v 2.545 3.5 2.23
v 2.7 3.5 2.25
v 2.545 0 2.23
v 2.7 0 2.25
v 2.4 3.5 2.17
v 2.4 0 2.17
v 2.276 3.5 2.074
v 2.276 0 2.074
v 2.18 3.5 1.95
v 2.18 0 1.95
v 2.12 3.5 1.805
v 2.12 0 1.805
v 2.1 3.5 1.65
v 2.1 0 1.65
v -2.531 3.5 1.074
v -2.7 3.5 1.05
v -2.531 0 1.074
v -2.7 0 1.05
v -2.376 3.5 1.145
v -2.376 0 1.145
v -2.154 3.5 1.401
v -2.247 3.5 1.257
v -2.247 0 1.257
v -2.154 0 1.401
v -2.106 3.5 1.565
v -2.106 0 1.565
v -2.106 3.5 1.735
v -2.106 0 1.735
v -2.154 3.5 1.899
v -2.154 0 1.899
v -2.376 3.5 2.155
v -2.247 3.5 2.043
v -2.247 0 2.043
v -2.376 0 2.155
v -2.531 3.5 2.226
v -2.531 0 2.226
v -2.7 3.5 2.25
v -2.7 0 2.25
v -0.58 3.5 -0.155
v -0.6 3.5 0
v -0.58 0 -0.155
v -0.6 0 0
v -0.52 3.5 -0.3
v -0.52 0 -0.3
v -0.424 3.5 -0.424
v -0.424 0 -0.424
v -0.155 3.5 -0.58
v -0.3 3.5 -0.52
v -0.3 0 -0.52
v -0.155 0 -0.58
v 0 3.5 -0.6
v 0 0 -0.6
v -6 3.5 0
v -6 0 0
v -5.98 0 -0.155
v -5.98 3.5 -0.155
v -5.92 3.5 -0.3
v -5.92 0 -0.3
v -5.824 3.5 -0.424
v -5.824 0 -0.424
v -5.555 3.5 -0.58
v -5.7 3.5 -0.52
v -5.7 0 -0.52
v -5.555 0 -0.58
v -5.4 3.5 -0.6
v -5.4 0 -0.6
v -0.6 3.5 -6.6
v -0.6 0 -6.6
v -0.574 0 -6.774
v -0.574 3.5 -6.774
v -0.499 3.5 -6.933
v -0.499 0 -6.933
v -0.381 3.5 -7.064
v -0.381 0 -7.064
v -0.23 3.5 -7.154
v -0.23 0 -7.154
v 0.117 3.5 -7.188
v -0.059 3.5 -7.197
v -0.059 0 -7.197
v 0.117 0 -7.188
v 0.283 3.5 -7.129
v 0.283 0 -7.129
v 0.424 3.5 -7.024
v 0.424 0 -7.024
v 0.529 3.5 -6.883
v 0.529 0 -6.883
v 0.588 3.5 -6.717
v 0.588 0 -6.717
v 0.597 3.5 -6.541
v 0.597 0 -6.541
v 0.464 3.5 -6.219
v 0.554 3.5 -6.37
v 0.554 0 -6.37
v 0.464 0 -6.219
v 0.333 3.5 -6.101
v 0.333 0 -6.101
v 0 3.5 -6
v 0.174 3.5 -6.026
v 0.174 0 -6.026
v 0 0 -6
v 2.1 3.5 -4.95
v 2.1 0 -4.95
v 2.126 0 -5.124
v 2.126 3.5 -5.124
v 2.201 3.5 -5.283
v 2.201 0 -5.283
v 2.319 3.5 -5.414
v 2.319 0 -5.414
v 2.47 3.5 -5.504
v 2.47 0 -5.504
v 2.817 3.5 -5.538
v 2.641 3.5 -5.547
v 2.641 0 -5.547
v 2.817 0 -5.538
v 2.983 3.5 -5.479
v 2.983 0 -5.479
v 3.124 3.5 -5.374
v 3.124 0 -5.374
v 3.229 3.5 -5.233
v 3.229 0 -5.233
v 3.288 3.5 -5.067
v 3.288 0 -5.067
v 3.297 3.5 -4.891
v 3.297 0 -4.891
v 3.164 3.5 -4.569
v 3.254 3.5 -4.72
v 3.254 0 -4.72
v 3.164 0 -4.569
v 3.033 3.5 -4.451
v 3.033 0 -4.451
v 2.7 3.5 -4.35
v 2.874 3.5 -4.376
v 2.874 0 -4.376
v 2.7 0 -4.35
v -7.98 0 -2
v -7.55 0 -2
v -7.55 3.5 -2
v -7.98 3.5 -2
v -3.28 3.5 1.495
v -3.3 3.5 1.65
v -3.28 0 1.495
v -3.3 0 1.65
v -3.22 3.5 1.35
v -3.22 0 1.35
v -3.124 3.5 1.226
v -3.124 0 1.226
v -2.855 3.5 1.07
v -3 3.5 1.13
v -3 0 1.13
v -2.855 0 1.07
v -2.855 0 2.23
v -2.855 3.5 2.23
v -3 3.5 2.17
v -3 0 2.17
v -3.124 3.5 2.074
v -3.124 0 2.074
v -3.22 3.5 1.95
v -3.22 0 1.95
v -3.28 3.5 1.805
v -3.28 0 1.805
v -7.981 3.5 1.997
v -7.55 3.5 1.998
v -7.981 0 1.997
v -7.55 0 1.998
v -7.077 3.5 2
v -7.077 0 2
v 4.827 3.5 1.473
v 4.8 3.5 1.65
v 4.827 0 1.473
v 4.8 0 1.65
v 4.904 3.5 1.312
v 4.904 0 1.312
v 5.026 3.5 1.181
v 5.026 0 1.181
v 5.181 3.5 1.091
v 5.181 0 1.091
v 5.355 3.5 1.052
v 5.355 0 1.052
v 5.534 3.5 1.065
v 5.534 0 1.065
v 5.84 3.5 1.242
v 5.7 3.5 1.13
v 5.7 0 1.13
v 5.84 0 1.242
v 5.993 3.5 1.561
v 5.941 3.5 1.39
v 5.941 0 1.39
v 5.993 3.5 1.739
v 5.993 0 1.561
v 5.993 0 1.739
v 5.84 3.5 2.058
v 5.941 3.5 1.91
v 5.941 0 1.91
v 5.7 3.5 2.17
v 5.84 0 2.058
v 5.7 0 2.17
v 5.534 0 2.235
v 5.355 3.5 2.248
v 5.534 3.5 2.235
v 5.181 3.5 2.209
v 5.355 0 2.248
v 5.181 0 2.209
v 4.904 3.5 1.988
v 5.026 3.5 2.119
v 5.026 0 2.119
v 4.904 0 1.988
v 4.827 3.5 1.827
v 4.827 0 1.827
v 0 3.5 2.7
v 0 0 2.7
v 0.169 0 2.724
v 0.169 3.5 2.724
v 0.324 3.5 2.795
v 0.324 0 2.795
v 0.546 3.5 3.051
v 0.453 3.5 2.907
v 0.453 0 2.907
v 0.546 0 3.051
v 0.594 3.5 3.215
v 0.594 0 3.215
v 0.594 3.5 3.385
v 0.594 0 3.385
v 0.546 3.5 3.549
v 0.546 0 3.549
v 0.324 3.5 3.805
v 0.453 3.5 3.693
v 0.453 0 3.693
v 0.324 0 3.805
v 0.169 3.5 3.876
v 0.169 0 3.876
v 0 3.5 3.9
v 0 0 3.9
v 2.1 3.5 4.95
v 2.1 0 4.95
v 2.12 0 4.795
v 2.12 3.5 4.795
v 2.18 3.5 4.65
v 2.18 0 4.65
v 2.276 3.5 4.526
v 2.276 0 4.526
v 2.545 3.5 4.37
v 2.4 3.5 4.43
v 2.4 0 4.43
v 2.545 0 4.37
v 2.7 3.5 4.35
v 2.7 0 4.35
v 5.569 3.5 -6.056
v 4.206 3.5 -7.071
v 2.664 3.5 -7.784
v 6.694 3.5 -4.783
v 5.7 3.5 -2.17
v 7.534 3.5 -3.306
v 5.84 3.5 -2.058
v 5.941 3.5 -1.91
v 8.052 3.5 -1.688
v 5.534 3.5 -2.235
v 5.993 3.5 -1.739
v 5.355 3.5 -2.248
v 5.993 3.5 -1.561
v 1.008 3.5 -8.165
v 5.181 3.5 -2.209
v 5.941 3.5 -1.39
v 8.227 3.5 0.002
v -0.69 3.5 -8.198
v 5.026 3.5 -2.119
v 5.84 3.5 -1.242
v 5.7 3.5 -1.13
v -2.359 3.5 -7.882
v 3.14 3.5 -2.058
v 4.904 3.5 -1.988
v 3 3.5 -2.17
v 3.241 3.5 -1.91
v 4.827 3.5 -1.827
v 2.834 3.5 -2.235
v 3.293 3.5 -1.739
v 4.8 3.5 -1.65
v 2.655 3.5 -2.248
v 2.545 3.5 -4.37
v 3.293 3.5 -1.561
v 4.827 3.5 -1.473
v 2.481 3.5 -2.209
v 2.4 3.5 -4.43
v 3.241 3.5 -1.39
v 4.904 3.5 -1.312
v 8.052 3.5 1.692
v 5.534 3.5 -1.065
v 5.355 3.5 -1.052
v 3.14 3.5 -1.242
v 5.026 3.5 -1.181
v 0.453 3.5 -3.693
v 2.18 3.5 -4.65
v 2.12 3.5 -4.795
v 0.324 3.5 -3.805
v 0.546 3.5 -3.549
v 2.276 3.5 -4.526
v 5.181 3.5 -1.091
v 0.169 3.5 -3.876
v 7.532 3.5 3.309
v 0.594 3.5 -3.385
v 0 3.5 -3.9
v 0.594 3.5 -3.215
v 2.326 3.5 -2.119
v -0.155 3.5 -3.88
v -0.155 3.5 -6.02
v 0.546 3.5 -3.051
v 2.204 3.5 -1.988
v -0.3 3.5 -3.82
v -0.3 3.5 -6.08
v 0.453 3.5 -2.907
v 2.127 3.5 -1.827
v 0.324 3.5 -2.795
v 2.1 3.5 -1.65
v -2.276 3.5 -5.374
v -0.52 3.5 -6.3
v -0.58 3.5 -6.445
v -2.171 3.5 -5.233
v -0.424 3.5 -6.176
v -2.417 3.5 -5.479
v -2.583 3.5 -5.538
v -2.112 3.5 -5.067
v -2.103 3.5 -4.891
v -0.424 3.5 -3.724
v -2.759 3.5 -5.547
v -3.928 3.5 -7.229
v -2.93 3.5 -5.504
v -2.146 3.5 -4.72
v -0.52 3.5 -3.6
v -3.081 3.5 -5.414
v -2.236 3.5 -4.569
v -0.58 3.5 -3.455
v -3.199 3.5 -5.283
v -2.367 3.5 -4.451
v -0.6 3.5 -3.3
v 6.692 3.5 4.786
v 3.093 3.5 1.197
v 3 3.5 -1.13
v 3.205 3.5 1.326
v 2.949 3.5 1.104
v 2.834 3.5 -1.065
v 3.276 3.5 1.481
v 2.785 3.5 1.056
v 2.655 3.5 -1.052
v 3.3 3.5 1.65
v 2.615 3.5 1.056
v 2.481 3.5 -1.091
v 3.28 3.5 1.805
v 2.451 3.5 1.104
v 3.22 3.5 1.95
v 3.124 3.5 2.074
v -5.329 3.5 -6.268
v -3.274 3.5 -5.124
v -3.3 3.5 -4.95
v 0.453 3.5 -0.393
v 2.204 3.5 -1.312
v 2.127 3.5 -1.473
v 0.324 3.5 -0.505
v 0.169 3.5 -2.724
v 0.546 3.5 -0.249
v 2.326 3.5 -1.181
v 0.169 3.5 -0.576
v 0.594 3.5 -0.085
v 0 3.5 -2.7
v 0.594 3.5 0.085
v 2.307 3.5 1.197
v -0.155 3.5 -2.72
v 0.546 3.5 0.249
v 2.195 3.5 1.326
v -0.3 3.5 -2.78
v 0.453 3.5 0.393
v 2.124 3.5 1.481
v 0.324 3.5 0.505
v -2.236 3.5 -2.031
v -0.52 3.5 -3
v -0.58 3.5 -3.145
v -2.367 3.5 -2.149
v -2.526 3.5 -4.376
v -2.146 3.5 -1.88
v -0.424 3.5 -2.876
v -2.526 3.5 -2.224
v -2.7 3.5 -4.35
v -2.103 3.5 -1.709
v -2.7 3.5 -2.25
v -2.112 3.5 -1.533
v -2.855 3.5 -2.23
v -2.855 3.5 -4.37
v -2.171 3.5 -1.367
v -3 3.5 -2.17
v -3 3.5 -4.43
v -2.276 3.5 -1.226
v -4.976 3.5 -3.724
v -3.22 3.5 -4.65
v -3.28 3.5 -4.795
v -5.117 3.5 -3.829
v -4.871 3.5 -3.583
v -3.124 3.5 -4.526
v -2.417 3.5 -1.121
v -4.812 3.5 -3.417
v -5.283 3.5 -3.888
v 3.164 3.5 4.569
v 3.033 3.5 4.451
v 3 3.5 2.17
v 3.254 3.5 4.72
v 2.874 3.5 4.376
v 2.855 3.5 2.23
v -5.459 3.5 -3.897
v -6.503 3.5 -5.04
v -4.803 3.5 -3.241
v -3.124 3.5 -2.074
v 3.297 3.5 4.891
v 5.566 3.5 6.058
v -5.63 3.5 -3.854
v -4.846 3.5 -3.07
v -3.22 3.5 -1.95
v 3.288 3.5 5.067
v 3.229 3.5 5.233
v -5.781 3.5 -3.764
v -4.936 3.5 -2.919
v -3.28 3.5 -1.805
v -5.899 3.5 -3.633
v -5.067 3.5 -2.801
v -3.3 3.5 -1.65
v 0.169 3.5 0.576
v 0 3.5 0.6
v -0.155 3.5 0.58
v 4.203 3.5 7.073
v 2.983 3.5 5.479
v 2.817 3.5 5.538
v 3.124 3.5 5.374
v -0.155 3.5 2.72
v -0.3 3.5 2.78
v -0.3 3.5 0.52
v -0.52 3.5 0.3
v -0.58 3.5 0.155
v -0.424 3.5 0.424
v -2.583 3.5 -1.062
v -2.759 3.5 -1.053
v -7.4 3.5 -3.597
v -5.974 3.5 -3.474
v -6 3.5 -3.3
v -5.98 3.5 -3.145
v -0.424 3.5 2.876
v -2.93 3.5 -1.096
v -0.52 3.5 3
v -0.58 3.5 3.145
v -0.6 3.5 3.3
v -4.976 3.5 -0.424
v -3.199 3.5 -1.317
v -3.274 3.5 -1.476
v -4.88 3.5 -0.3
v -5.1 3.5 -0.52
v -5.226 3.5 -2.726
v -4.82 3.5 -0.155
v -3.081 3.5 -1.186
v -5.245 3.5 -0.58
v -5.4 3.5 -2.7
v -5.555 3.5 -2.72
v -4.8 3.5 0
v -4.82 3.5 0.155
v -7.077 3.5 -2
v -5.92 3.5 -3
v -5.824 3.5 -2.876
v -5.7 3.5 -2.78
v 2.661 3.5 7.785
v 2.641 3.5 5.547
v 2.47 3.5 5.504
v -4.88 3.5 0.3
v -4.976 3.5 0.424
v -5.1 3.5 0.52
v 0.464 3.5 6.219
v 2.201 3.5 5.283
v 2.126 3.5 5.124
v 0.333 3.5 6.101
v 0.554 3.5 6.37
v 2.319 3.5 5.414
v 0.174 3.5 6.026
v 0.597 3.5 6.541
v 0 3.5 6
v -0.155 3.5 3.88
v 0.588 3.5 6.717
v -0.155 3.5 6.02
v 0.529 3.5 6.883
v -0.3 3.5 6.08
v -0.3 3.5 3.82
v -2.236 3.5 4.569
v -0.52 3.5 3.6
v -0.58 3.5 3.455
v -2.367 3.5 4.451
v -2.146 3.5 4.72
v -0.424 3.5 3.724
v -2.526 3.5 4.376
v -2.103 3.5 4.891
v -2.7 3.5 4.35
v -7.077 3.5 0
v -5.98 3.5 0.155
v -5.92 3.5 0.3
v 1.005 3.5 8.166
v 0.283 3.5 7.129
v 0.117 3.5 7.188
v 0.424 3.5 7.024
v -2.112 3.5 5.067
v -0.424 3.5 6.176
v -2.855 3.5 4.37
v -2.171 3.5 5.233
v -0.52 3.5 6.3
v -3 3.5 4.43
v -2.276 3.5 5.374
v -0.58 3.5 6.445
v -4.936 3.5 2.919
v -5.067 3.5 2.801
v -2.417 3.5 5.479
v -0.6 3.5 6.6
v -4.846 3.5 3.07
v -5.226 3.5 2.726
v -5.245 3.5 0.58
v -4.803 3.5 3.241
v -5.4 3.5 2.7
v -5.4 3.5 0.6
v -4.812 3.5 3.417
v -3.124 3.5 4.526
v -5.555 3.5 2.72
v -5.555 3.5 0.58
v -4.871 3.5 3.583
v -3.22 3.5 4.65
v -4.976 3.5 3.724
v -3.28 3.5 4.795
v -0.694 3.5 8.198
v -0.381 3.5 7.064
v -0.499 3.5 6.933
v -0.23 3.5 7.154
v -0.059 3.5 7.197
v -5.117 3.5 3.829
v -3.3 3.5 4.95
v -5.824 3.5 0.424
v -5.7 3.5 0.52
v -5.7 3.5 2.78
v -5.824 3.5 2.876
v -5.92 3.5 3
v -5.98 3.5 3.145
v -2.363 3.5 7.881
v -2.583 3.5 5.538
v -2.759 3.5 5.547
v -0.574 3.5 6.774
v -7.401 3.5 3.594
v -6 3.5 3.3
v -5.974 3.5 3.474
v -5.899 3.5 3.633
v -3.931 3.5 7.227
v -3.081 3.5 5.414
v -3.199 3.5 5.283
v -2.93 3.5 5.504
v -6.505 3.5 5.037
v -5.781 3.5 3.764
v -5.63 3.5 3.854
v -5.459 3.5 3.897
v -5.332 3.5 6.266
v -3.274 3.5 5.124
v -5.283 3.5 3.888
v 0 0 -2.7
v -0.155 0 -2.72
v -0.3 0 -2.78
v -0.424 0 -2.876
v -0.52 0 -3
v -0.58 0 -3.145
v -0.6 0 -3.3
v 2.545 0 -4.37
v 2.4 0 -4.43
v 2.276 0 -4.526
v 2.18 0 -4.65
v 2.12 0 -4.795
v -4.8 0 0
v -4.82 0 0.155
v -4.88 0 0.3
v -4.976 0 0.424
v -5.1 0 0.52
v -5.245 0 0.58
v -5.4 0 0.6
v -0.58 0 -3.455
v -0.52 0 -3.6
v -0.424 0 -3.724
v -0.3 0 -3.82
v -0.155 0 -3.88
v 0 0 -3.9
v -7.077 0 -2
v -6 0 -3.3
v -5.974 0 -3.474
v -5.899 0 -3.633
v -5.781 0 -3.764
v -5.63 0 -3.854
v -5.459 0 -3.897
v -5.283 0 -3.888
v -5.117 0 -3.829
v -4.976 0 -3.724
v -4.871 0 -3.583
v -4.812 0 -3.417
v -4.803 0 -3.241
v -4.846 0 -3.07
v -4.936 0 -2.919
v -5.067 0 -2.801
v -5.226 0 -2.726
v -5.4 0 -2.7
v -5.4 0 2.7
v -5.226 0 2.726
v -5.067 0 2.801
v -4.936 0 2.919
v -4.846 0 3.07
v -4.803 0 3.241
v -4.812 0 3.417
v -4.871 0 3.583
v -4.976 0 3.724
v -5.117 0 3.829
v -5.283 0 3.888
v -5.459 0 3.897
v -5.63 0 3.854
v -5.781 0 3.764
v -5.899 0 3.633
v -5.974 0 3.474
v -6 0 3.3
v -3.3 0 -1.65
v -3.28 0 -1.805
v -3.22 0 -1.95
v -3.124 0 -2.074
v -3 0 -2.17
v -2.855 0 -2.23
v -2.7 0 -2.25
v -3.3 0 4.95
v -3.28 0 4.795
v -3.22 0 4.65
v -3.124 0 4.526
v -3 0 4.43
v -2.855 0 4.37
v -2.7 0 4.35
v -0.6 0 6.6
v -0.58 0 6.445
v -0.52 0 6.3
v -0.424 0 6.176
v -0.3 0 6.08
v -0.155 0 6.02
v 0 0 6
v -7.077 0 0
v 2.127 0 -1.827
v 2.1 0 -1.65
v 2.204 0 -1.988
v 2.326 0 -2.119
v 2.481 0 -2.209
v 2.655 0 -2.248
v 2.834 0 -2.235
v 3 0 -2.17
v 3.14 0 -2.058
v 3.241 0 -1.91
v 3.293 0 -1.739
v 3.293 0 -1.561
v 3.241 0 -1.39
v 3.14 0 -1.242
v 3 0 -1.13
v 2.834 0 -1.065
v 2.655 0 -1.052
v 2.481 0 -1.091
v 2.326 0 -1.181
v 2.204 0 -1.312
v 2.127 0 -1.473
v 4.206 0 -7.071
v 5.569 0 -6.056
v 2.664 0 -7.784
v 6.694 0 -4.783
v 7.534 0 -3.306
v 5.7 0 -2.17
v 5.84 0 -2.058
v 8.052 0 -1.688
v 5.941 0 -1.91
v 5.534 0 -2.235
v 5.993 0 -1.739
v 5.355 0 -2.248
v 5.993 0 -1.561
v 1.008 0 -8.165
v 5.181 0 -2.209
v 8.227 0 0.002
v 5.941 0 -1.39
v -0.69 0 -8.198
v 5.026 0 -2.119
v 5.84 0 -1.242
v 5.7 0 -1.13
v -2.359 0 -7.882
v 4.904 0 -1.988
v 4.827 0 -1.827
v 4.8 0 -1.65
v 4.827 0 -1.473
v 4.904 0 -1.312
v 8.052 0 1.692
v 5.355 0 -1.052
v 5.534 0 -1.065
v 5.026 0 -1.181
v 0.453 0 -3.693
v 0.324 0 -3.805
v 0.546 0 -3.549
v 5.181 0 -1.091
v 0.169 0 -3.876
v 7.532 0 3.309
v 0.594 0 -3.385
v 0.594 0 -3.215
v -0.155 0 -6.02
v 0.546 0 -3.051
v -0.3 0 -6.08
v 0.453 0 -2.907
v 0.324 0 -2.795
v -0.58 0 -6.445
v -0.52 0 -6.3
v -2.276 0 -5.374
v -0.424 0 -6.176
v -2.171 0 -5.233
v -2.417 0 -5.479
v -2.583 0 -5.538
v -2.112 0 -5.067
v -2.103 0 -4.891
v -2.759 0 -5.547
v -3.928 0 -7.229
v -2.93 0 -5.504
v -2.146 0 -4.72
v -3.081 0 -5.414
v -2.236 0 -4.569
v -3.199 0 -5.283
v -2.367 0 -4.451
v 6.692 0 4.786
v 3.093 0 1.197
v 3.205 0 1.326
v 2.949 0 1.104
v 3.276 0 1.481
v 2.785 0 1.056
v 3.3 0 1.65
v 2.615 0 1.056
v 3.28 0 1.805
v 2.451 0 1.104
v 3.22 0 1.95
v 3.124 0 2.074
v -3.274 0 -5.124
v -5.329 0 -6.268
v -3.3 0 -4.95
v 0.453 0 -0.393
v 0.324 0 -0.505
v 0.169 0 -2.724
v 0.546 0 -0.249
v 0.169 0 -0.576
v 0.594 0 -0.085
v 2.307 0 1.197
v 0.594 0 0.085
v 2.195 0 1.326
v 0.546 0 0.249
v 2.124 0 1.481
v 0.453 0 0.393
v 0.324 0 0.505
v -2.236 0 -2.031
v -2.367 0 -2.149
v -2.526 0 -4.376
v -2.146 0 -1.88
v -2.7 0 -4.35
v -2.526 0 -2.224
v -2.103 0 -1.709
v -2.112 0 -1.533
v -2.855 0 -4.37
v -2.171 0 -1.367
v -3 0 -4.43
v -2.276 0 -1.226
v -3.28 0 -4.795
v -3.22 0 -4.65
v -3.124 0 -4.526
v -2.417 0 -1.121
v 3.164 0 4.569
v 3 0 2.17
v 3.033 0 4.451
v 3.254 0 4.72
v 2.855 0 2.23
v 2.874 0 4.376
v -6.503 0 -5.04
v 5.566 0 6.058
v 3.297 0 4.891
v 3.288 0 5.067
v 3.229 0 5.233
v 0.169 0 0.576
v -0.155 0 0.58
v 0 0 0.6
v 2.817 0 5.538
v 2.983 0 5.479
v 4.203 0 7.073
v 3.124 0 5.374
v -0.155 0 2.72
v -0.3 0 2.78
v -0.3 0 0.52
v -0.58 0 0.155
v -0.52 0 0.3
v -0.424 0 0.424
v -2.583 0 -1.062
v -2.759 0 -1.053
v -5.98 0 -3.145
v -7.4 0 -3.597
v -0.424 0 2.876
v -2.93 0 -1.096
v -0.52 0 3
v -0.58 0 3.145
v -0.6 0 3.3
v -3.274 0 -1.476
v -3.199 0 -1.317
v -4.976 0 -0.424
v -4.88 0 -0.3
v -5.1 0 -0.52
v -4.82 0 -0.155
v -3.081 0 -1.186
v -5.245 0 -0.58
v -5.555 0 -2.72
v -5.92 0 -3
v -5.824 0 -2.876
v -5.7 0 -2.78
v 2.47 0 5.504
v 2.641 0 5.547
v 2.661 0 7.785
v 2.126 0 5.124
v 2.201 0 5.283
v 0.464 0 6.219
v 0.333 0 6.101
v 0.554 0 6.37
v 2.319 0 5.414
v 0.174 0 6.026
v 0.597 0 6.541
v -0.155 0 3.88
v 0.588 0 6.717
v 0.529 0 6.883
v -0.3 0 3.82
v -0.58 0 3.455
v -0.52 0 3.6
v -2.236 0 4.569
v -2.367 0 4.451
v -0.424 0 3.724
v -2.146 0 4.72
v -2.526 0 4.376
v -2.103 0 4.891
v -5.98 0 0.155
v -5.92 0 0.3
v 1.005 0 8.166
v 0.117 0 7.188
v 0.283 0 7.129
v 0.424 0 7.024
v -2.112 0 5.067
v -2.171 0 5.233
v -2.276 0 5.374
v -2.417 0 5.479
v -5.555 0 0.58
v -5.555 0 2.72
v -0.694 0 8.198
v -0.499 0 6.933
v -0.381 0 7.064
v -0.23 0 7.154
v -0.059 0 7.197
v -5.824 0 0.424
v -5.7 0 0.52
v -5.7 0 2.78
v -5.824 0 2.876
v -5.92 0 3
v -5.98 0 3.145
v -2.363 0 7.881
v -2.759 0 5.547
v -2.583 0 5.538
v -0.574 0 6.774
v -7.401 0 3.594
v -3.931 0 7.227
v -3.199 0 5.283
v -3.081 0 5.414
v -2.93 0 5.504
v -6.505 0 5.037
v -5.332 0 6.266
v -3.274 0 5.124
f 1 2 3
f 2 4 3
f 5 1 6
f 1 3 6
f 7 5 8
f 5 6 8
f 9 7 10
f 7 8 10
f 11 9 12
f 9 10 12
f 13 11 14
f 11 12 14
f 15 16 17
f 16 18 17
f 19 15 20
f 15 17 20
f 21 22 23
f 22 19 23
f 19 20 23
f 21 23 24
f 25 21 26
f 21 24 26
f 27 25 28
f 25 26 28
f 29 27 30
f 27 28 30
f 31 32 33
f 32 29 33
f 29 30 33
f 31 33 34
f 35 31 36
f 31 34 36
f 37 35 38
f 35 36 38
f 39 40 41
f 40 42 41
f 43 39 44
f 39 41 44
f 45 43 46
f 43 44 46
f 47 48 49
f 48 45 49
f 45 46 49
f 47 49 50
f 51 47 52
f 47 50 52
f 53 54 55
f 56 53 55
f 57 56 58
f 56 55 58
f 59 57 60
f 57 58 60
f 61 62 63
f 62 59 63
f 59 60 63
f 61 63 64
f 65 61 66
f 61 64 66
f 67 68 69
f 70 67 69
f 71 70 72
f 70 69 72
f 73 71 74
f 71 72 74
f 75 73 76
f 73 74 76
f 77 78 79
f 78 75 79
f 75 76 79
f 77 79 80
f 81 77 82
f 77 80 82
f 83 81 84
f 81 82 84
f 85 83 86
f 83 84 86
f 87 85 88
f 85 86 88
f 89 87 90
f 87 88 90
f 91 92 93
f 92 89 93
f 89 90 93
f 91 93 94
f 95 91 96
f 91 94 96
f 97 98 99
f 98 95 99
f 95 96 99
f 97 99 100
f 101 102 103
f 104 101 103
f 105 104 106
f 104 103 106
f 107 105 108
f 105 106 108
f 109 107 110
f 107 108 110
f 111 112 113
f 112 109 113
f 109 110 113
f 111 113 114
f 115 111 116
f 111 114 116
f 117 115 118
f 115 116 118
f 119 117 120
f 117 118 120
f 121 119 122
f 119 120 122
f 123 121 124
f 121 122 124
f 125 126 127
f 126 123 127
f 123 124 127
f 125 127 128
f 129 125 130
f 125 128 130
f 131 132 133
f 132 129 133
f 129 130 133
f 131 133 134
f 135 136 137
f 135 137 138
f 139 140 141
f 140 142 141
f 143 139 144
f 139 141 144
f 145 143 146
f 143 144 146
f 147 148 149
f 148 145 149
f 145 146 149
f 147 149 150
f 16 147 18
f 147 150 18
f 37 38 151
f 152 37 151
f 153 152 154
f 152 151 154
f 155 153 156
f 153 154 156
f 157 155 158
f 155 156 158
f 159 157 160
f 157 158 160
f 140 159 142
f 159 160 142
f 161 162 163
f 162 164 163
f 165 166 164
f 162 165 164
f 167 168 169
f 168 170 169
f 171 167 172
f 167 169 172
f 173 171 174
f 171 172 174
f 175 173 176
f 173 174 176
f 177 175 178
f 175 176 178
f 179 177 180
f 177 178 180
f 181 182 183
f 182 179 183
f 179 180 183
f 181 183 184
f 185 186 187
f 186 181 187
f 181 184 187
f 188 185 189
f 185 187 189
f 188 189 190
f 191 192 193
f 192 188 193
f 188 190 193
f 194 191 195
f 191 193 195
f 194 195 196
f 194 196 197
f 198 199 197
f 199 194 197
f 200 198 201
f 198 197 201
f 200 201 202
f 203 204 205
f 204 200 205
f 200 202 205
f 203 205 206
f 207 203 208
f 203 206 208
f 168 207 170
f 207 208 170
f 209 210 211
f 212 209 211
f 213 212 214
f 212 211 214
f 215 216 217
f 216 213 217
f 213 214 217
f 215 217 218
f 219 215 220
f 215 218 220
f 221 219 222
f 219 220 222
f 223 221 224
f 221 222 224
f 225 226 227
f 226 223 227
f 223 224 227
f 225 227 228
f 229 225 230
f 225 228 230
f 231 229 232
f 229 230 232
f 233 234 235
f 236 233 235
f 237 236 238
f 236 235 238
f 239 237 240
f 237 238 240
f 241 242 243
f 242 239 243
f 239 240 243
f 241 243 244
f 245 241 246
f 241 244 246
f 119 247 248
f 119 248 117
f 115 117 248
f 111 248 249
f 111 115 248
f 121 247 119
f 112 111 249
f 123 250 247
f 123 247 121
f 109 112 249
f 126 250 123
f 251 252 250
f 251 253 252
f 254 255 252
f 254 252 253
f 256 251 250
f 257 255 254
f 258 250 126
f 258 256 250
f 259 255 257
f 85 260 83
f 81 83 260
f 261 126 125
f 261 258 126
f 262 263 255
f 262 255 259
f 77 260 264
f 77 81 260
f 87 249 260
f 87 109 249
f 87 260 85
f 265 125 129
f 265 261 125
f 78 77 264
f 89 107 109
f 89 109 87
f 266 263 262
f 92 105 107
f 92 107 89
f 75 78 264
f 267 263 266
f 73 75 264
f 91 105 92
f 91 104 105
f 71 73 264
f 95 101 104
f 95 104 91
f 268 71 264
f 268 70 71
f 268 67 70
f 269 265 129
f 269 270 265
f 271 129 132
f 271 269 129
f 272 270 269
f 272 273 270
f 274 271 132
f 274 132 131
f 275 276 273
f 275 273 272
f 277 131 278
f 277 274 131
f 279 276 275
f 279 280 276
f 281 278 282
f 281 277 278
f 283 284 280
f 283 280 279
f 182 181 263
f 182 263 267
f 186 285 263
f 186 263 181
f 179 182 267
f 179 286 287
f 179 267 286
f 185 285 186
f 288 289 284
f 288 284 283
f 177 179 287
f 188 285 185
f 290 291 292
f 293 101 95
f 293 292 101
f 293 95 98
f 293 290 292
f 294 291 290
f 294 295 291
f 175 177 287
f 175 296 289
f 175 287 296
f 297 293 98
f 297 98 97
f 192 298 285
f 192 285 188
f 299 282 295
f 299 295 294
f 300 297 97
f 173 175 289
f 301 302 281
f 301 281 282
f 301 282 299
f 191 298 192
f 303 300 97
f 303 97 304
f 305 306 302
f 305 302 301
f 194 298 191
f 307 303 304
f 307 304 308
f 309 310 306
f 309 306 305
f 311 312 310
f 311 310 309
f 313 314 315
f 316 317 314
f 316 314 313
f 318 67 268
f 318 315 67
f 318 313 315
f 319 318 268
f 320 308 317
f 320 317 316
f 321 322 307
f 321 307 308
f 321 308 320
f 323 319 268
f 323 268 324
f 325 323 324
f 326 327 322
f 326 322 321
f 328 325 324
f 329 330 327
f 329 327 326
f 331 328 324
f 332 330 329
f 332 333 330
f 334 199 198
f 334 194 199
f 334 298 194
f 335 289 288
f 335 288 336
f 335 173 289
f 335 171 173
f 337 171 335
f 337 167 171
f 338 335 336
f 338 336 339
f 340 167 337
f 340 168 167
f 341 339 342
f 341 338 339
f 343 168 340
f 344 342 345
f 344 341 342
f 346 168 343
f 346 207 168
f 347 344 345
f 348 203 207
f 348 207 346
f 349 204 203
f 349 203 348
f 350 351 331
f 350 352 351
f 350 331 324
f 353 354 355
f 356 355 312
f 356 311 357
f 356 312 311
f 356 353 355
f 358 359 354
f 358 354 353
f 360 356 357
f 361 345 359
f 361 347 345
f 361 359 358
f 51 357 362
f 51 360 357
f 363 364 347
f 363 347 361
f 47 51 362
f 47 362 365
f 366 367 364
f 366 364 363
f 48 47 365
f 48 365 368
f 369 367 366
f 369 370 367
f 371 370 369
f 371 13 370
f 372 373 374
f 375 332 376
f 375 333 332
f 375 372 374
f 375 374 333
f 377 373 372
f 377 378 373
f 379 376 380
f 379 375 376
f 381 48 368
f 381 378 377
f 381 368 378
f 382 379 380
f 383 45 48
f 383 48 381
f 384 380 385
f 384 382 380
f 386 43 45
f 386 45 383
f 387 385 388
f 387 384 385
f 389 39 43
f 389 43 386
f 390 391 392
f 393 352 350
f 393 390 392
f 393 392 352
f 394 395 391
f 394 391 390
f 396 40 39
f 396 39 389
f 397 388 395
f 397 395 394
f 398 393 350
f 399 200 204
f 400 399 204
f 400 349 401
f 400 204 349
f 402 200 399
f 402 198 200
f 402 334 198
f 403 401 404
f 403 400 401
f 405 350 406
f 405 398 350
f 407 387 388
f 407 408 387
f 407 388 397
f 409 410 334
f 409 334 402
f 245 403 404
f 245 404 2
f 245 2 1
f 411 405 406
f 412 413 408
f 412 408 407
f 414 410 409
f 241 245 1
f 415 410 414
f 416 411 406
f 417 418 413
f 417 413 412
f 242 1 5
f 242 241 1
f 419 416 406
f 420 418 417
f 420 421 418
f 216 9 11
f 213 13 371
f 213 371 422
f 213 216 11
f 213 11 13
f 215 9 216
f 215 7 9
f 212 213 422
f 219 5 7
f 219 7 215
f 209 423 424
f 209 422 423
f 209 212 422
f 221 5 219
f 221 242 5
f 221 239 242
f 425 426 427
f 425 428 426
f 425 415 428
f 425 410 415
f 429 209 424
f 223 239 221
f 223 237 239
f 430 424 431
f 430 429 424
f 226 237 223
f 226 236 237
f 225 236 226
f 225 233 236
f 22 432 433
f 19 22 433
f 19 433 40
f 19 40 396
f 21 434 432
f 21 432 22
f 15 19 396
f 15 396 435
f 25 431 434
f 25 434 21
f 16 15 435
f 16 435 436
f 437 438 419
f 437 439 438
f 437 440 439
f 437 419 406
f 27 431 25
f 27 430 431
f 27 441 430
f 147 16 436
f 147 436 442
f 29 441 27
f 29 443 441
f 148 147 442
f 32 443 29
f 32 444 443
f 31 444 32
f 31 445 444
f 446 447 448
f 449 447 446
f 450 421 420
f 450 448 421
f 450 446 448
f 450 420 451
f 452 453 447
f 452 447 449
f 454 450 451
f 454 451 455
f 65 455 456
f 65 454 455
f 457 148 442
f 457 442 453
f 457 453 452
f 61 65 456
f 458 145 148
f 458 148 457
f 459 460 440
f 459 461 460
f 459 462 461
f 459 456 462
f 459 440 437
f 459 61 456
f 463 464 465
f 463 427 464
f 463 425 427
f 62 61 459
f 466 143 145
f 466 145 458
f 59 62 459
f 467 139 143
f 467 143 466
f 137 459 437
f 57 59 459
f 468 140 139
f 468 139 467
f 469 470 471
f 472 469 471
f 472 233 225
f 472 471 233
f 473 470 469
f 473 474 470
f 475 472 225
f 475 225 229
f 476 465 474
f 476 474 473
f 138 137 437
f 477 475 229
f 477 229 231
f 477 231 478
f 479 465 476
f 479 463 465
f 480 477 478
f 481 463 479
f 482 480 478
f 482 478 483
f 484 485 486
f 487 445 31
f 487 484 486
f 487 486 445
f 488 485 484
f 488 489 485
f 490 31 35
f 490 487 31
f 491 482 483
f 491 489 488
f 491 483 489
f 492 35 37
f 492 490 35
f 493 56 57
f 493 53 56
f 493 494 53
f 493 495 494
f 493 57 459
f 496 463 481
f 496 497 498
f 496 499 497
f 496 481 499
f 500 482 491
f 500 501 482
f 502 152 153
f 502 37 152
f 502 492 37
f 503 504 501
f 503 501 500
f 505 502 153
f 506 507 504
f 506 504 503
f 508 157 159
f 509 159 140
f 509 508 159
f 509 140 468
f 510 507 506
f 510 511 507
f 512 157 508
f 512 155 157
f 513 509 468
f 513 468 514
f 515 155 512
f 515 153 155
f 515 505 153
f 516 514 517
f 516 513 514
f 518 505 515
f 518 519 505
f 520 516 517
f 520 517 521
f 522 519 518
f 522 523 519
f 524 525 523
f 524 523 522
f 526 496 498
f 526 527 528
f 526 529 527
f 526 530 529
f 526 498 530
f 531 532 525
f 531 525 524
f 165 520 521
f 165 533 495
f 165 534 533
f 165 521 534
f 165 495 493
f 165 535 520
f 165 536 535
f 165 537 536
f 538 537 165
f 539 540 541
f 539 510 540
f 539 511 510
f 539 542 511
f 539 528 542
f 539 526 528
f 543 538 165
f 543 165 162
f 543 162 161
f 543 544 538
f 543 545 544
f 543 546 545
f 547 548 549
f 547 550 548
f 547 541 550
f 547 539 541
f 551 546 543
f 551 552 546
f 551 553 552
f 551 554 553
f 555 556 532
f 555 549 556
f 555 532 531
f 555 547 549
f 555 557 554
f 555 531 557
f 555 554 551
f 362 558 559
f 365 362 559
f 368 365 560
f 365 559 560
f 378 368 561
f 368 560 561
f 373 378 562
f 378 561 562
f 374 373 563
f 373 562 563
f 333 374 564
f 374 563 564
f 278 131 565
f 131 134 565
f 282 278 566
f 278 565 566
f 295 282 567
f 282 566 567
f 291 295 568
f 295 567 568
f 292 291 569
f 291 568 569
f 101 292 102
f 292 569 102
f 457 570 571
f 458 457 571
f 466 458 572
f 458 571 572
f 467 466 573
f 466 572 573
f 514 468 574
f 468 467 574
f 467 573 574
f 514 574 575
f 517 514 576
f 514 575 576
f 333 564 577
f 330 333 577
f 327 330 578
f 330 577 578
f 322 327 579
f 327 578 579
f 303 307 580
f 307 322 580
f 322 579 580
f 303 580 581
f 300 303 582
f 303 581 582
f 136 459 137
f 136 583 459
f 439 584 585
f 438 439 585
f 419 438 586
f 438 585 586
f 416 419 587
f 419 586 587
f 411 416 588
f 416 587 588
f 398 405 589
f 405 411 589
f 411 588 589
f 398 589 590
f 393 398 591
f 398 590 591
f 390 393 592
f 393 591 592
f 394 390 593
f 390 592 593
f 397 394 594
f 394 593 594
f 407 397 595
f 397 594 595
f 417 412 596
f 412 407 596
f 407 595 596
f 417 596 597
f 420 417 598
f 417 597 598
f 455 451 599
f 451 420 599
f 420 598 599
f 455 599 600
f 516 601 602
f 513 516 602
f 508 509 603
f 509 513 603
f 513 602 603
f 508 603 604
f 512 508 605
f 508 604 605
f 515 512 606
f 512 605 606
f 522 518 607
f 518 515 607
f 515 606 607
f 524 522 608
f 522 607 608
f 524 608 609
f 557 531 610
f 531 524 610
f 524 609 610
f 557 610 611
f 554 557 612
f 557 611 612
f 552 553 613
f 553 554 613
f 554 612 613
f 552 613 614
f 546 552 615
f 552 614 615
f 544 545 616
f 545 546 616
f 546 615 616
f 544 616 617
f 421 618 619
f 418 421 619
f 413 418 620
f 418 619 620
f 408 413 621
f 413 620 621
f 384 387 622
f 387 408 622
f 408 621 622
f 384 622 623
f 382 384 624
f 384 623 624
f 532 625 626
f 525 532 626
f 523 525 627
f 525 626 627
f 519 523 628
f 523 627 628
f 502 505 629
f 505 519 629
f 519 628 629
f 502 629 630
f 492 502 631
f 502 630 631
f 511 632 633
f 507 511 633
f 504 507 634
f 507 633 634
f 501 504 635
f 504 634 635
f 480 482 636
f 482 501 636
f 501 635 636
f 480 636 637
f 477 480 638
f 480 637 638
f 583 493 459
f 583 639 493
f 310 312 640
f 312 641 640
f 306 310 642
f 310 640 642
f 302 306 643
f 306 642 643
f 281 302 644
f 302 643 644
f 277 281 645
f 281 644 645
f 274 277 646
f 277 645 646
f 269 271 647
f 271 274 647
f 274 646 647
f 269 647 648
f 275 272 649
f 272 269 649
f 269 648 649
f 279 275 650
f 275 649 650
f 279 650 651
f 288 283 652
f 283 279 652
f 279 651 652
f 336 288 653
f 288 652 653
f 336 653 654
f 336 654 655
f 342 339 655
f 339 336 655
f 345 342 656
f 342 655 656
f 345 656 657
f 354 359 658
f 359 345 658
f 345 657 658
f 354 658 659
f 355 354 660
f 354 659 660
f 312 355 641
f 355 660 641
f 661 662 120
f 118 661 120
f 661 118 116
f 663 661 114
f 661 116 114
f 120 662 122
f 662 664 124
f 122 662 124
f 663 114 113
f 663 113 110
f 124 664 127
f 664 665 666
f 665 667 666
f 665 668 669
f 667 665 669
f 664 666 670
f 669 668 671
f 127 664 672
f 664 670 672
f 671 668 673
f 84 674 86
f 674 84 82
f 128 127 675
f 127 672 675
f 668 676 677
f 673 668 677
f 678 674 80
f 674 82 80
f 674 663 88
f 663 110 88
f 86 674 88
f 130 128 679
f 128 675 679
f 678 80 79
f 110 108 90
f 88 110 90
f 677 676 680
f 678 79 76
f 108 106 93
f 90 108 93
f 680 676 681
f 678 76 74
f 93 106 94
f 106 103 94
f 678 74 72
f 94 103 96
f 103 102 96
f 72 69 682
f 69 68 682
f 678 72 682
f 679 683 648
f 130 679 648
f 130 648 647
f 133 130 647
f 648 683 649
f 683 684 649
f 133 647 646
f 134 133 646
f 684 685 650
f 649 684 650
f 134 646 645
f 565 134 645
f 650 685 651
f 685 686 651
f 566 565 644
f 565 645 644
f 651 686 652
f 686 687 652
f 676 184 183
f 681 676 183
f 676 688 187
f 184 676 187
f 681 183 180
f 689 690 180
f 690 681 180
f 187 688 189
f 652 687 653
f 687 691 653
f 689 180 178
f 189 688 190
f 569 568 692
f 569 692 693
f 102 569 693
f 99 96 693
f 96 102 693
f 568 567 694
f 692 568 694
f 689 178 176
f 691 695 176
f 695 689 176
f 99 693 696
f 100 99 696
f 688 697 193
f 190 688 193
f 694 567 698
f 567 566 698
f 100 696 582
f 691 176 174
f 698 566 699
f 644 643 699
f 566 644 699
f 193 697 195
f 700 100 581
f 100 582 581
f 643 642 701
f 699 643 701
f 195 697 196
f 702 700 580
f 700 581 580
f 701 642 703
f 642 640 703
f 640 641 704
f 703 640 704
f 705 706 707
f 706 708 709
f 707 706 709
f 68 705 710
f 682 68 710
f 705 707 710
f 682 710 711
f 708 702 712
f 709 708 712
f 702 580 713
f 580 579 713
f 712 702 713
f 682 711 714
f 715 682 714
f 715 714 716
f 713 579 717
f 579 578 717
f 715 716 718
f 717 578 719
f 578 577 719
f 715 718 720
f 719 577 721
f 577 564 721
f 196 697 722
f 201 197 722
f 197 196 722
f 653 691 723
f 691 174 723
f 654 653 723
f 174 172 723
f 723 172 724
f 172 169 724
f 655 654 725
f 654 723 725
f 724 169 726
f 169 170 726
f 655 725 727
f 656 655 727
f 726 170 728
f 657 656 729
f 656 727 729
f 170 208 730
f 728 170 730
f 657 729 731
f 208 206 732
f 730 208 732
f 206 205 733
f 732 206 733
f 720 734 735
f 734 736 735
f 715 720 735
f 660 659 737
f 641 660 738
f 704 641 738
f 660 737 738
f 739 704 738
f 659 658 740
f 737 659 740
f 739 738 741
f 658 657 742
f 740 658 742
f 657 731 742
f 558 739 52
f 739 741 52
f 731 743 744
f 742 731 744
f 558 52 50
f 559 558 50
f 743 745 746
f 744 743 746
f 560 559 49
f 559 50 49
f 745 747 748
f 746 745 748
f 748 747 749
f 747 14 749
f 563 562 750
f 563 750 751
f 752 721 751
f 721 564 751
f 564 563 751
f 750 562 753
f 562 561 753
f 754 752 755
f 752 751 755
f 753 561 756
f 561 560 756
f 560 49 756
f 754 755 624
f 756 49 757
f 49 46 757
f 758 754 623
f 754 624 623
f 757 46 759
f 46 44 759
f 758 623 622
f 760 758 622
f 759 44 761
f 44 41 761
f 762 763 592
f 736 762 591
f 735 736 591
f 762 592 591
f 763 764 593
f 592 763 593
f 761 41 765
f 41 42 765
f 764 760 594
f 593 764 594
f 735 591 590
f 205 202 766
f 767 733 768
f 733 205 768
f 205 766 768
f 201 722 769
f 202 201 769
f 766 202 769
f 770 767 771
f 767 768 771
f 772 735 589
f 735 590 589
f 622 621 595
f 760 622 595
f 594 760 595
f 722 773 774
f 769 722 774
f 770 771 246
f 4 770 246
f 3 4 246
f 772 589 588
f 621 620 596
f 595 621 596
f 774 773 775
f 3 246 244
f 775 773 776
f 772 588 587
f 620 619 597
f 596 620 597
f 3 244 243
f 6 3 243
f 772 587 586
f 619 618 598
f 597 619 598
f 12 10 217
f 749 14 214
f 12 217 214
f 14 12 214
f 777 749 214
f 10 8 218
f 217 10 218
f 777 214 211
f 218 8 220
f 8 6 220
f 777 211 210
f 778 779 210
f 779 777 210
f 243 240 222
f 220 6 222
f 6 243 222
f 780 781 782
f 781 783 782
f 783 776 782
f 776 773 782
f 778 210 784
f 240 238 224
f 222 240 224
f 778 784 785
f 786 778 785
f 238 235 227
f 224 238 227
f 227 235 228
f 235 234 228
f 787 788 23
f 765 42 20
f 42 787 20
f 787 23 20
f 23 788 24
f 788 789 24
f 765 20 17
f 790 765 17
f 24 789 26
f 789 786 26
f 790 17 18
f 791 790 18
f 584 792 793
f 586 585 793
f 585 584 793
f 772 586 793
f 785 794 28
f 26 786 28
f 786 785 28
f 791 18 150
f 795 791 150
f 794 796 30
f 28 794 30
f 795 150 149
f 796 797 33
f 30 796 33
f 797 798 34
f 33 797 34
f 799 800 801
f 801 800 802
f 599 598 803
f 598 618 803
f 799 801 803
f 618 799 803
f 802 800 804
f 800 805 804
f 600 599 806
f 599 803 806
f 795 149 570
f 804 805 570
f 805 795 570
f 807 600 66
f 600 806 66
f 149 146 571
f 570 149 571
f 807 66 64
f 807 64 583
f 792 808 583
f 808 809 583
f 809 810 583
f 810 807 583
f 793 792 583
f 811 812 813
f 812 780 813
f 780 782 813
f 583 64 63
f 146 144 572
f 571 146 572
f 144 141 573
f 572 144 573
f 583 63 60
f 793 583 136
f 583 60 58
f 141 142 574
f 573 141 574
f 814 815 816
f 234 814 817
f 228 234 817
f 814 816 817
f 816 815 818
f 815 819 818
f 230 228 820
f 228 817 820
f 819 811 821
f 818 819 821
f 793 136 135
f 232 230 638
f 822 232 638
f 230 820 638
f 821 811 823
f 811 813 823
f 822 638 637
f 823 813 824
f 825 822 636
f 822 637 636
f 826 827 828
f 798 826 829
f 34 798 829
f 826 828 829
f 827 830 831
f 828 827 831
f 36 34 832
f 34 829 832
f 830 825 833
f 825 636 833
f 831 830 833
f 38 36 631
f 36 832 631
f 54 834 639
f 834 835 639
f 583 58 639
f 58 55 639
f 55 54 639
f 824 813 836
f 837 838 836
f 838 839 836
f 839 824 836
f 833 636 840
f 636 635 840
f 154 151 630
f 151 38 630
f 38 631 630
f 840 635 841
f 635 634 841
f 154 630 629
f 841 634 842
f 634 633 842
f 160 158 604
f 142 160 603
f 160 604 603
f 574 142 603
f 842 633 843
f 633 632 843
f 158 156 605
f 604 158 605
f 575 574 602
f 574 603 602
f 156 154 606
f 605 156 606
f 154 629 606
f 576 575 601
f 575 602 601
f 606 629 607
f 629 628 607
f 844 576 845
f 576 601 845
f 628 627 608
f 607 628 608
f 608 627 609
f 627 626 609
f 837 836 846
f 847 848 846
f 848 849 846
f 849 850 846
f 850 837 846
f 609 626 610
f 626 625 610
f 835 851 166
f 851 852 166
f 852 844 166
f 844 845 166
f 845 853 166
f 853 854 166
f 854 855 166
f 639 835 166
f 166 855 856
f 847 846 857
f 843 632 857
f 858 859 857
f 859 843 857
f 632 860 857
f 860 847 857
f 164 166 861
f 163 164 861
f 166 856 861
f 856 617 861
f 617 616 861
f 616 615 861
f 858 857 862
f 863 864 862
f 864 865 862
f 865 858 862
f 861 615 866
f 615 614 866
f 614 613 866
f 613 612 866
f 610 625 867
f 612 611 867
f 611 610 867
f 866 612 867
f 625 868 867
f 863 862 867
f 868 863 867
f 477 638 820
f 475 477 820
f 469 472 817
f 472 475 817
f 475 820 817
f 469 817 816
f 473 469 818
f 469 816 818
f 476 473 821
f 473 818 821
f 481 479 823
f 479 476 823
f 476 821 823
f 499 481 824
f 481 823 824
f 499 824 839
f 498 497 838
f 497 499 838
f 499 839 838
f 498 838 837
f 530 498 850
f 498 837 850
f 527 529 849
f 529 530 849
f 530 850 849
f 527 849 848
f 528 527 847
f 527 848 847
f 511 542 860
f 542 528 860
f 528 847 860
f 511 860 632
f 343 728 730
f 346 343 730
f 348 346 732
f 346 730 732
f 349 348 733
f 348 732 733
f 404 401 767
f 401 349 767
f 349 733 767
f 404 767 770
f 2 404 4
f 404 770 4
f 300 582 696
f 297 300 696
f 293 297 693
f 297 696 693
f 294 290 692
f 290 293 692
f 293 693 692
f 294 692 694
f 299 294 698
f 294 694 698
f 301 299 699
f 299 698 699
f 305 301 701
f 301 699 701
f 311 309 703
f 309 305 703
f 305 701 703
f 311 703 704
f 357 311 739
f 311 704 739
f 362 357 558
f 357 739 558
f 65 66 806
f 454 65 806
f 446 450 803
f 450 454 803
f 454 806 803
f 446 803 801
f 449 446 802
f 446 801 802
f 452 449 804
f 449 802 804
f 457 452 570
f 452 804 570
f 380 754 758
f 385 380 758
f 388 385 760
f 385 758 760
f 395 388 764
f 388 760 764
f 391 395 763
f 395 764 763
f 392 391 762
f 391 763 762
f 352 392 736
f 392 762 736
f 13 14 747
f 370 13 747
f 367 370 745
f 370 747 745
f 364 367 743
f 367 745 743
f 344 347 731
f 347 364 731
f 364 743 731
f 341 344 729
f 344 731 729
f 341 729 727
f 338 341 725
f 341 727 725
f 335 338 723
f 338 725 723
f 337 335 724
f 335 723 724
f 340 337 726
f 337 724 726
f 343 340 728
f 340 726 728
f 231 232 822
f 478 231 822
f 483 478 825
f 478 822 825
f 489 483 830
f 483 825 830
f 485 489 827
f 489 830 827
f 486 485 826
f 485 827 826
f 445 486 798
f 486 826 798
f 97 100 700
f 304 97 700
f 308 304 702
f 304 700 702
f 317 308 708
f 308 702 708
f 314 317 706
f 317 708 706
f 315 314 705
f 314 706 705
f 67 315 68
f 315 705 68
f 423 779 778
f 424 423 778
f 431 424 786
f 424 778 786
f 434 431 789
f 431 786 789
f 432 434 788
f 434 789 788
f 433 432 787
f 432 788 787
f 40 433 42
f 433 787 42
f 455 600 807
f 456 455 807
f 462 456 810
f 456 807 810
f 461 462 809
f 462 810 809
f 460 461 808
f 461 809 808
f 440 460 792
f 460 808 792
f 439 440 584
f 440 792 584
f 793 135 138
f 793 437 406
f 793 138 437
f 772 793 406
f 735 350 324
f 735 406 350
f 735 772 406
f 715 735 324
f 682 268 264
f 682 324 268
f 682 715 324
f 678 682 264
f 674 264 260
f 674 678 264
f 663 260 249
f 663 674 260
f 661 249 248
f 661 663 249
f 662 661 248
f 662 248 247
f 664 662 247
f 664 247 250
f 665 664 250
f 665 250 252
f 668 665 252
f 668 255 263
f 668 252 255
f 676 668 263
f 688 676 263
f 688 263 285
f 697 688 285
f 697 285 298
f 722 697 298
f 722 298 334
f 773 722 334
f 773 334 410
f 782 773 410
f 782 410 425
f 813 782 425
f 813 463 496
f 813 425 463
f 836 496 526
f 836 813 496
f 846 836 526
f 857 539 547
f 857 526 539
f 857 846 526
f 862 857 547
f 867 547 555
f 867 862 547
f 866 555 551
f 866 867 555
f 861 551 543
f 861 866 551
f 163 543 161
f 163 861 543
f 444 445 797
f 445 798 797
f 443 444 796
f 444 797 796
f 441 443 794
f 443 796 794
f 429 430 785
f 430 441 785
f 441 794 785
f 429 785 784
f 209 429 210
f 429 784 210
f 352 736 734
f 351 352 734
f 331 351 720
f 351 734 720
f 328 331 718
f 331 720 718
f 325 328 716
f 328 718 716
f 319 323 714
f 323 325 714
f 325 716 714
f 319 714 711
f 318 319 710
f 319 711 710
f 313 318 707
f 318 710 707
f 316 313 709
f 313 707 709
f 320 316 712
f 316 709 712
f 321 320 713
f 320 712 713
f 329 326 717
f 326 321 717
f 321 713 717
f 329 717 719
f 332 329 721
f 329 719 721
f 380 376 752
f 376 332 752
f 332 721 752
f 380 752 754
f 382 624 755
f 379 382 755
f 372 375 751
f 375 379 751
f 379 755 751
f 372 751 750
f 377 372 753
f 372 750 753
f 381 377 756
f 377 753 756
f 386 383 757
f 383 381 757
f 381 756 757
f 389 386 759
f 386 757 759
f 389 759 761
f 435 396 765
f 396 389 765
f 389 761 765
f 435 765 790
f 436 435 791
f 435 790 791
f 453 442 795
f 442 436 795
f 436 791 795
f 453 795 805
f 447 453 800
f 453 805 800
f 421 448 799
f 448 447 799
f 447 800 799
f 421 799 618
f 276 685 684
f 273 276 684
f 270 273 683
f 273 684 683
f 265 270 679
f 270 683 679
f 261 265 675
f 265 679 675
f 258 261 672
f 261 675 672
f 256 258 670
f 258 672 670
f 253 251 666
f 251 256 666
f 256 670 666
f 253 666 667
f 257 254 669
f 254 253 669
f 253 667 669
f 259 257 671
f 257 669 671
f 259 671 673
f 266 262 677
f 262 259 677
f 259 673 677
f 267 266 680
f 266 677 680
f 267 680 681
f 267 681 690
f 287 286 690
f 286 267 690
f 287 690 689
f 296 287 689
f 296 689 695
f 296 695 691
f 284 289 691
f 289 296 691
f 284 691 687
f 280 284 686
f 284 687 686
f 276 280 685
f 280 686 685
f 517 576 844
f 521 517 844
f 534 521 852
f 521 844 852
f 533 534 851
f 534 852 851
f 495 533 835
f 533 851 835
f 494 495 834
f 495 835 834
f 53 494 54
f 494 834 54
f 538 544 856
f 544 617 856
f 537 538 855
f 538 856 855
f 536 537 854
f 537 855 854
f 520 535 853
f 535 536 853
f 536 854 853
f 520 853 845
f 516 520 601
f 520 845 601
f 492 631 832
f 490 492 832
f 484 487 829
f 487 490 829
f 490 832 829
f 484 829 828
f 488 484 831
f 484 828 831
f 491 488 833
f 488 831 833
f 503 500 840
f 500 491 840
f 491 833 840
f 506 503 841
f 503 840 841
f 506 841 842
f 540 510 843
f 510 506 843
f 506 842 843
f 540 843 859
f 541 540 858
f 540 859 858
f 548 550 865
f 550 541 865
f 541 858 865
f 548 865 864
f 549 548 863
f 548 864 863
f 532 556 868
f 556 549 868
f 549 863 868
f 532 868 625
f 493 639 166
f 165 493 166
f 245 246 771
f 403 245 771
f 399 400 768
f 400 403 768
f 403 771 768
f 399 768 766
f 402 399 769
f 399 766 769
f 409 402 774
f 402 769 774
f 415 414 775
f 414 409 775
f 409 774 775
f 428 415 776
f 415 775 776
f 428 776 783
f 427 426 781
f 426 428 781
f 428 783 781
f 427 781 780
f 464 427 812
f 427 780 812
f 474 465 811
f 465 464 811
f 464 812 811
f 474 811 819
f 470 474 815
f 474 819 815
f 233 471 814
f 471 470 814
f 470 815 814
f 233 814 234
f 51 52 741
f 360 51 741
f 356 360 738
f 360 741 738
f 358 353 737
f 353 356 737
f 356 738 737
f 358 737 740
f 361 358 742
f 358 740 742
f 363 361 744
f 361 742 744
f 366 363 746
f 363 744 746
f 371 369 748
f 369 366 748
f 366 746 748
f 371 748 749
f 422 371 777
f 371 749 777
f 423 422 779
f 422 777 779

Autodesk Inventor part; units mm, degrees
ref_plane "YZ Plane" through (0, 0, 0) normal (1, 0, 0) x (0, 1, 0)
ref_plane "XZ Plane" through (0, 0, 0) normal (0, 1, 0) x (-1, 0, 0)
ref_plane "XY Plane" through (0, 0, 0) normal (0, 0, 1) x (1, 0, 0)
sketch "Sketch1" plane through (0, 0, 0) normal (0, 1, 0) x (-1, 0, 0)
  point P0 (0, 0)
sketch "Sketch3" plane through (0, 0, 0) normal (0, 1, 0) x (-1, 0, 0)
  circle A0 centre (0, 0) radius 8.2273
  line L0 (0, 0) -> (7.55, 0)
  line L1 (7.55, -2) -> (7.9805, -2)
  line L2 (7.55, 1.9983) -> (7.9813, 1.9967)
  circle A1 centre (-2.7, -1.65) radius 0.6
  line L3 (-2.7, -4.35) -> (-2.7, -4.95)
  circle A2 centre (-2.7, -4.95) radius 0.6
  line L4 (0, -0.6) -> (0, -1.65)
  line L5 (0, -0.6) -> (0, -1.65)
  circle A3 centre (0, 0) radius 0.6
  circle A4 centre (-5.4, -1.65) radius 0.6
  line L6 (-2.7, 1.65) -> (-5.4, 1.65)
  circle A5 centre (-5.4, 1.65) radius 0.6
  line L7 (0, 0.6) -> (0, 3.3)
  circle A6 centre (0, 3.3) radius 0.6
  circle A7 centre (-2.7, 1.65) radius 0.6
  line L8 (-2.7, 1.65) -> (-2.7, 4.95)
  circle A8 centre (-2.7, 4.95) radius 0.6
  line L9 (0, 3.9) -> (0, 6.6)
  circle A9 centre (0, 6.6) radius 0.6
  circle A10 centre (5.4, 0) radius 0.6
  line L10 (2.7, 1.05) -> (2.7, 1.65)
  circle A11 centre (2.7, 1.65) radius 0.6
  line L11 (5.4, 0) -> (5.4, 3.3)
  circle A12 centre (5.4, 3.3) radius 0.6
  line L12 (2.7, 2.25) -> (2.7, 4.95)
  circle A13 centre (2.7, 4.95) radius 0.6
  line L13 (0, -2.7) -> (0, -3.3)
  circle A14 centre (0, -3.3) radius 0.6
  line L14 (0, -3.9) -> (0, -6)
  line L15 (0, -6) -> (0, -6.6)
  circle A15 centre (0, -6.6) radius 0.6
  line L16 (2.7, 0) -> (5.4, 0)
  circle A16 centre (2.7, -1.65) radius 0.6
  line L17 (5.4, 0) -> (5.4, -3.3)
  circle A17 centre (5.4, -3.3) radius 0.6
  line L18 (2.7, -3.75) -> (2.7, -4.95)
  circle A18 centre (2.7, -4.95) radius 0.6
  line L19 (2.7, -1.65) -> (2.7, -3.75)
  line L20 (8.2273, 0.0003) -> (7.0773, 0)
  line L21 (7.0773, 0) -> (7.0773, 2)
  line L22 (7.0773, 2) -> (7.55, 1.9983)
  line L23 (7.0773, 0) -> (7.0773, -2)
  line L24 (7.0773, -2) -> (7.55, -2)
  dimension "d10" = 1.2
  dimension "d15" = 1.2
  dimension "d26" = 1.2
  dimension "d3" = 2
  dimension "d7" = 1.2
  dimension "d8" = 2.1
  dimension "d9" = 0.6
  dimension "d11" = 2.1
  dimension "d12" = 0.6
  dimension "d13" = 1.2
  dimension "d14" = 2.7
  dimension "d16" = 2.7
  dimension "d17" = 1.2
  dimension "d18" = 1.05
  dimension "d20" = 1.2
  dimension "d21" = 2.1
  dimension "d22" = 1.2
  dimension "d23" = 1.2
  dimension "d25" = 0.6
  dimension "d27" = 2.7
  dimension "d28" = 1.2
  dimension "d29" = 2.7
  dimension "d30" = 1.2
  dimension "d31" = 1.2
  dimension "d32" = 1.2
  dimension "d34" = 1.2
  dimension "d35" = 2.7
  dimension "d36" = 0.6
  dimension "d37" = 1.2
  dimension "d38" = 1.2
  dimension "d39" = 1.2
  dimension "d42" = 2.7
  dimension "d46" = 1.15
  dimension "d47" = 2
  dimension "d48" = 2
extrude "Extrusion1" add sketch "Sketch3" along normal blind 3.5 contours L2 L22 L21 L23 L24 L1 A0
properties part number "male"
